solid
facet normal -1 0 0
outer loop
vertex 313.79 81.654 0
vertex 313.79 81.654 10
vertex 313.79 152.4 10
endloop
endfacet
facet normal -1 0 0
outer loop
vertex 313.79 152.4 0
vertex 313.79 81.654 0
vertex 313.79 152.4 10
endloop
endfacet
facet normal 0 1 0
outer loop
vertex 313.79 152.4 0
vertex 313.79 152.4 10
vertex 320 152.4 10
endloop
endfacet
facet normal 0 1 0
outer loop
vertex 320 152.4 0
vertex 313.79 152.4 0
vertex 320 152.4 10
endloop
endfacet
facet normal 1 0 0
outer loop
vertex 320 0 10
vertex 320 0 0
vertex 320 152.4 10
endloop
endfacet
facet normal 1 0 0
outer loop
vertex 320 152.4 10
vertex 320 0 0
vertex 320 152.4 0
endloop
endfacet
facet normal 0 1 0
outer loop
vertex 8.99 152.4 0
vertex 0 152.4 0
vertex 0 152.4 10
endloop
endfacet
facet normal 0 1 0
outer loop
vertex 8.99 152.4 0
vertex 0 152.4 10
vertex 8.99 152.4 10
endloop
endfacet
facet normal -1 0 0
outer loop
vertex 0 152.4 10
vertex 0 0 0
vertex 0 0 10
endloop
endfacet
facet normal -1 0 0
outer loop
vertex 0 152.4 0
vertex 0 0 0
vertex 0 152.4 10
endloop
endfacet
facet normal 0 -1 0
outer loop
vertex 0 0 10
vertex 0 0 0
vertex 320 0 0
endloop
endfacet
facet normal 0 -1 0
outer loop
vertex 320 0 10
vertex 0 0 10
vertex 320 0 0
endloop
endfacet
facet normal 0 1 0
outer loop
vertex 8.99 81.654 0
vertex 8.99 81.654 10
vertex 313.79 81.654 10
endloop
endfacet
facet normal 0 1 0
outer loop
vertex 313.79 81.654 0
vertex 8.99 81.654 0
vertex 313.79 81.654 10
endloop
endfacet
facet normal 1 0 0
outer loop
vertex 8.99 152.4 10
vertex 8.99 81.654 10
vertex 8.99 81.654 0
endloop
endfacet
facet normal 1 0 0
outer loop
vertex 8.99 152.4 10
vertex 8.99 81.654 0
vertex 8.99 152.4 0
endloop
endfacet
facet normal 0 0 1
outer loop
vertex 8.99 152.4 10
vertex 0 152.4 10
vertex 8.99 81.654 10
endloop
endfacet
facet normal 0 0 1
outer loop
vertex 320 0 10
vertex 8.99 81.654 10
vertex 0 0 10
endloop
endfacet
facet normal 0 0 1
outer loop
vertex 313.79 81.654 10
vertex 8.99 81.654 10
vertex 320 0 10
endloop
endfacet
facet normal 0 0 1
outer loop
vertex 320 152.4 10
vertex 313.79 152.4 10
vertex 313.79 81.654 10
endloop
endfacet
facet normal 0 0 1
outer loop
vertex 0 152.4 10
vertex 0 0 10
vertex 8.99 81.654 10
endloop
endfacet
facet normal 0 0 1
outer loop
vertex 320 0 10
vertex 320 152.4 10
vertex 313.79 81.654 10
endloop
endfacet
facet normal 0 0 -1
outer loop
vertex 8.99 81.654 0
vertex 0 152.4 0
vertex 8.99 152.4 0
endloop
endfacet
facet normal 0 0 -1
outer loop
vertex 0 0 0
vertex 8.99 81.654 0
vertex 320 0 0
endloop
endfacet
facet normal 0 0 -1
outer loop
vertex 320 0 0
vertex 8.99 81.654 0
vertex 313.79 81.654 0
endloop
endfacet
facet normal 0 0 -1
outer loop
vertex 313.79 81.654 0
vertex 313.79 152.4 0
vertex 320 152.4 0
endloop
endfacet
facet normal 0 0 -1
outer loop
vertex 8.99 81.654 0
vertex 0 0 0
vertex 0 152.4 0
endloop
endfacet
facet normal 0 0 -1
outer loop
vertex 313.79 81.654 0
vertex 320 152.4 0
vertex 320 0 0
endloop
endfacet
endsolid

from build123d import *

# Parameters (mm, degrees)
SKETCH2_W               = 320
SKETCH2_H               = 152.4
BOSS_EXTRUDE2_DEPTH     = 10
SKETCH7_W               = 304.8
SKETCH7_H               = 75.37972508
CUT_EXTRUDE1_DEPTH      = 1
CUT_EXTRUDE1_DEPTH_BACK = 11


with BuildPart() as part:
    # Sketch2 → Boss-Extrude2 (new body)
    with BuildSketch(Plane.XY):
        with Locations((160, 76.2)):
            Rectangle(SKETCH2_W, SKETCH2_H)
    extrude(amount=BOSS_EXTRUDE2_DEPTH)

    # Sketch7 → Cut-Extrude1 (cut, two sides)
    with BuildSketch(Plane.XY.offset(10)) as cut_extrude1_sk:
        with Locations((161.389929353, 119.344096734)):
            Rectangle(SKETCH7_W, SKETCH7_H)
    extrude(amount=CUT_EXTRUDE1_DEPTH, mode=Mode.SUBTRACT)
    extrude(cut_extrude1_sk.sketch, amount=-CUT_EXTRUDE1_DEPTH_BACK, mode=Mode.SUBTRACT)


solid = part.part
